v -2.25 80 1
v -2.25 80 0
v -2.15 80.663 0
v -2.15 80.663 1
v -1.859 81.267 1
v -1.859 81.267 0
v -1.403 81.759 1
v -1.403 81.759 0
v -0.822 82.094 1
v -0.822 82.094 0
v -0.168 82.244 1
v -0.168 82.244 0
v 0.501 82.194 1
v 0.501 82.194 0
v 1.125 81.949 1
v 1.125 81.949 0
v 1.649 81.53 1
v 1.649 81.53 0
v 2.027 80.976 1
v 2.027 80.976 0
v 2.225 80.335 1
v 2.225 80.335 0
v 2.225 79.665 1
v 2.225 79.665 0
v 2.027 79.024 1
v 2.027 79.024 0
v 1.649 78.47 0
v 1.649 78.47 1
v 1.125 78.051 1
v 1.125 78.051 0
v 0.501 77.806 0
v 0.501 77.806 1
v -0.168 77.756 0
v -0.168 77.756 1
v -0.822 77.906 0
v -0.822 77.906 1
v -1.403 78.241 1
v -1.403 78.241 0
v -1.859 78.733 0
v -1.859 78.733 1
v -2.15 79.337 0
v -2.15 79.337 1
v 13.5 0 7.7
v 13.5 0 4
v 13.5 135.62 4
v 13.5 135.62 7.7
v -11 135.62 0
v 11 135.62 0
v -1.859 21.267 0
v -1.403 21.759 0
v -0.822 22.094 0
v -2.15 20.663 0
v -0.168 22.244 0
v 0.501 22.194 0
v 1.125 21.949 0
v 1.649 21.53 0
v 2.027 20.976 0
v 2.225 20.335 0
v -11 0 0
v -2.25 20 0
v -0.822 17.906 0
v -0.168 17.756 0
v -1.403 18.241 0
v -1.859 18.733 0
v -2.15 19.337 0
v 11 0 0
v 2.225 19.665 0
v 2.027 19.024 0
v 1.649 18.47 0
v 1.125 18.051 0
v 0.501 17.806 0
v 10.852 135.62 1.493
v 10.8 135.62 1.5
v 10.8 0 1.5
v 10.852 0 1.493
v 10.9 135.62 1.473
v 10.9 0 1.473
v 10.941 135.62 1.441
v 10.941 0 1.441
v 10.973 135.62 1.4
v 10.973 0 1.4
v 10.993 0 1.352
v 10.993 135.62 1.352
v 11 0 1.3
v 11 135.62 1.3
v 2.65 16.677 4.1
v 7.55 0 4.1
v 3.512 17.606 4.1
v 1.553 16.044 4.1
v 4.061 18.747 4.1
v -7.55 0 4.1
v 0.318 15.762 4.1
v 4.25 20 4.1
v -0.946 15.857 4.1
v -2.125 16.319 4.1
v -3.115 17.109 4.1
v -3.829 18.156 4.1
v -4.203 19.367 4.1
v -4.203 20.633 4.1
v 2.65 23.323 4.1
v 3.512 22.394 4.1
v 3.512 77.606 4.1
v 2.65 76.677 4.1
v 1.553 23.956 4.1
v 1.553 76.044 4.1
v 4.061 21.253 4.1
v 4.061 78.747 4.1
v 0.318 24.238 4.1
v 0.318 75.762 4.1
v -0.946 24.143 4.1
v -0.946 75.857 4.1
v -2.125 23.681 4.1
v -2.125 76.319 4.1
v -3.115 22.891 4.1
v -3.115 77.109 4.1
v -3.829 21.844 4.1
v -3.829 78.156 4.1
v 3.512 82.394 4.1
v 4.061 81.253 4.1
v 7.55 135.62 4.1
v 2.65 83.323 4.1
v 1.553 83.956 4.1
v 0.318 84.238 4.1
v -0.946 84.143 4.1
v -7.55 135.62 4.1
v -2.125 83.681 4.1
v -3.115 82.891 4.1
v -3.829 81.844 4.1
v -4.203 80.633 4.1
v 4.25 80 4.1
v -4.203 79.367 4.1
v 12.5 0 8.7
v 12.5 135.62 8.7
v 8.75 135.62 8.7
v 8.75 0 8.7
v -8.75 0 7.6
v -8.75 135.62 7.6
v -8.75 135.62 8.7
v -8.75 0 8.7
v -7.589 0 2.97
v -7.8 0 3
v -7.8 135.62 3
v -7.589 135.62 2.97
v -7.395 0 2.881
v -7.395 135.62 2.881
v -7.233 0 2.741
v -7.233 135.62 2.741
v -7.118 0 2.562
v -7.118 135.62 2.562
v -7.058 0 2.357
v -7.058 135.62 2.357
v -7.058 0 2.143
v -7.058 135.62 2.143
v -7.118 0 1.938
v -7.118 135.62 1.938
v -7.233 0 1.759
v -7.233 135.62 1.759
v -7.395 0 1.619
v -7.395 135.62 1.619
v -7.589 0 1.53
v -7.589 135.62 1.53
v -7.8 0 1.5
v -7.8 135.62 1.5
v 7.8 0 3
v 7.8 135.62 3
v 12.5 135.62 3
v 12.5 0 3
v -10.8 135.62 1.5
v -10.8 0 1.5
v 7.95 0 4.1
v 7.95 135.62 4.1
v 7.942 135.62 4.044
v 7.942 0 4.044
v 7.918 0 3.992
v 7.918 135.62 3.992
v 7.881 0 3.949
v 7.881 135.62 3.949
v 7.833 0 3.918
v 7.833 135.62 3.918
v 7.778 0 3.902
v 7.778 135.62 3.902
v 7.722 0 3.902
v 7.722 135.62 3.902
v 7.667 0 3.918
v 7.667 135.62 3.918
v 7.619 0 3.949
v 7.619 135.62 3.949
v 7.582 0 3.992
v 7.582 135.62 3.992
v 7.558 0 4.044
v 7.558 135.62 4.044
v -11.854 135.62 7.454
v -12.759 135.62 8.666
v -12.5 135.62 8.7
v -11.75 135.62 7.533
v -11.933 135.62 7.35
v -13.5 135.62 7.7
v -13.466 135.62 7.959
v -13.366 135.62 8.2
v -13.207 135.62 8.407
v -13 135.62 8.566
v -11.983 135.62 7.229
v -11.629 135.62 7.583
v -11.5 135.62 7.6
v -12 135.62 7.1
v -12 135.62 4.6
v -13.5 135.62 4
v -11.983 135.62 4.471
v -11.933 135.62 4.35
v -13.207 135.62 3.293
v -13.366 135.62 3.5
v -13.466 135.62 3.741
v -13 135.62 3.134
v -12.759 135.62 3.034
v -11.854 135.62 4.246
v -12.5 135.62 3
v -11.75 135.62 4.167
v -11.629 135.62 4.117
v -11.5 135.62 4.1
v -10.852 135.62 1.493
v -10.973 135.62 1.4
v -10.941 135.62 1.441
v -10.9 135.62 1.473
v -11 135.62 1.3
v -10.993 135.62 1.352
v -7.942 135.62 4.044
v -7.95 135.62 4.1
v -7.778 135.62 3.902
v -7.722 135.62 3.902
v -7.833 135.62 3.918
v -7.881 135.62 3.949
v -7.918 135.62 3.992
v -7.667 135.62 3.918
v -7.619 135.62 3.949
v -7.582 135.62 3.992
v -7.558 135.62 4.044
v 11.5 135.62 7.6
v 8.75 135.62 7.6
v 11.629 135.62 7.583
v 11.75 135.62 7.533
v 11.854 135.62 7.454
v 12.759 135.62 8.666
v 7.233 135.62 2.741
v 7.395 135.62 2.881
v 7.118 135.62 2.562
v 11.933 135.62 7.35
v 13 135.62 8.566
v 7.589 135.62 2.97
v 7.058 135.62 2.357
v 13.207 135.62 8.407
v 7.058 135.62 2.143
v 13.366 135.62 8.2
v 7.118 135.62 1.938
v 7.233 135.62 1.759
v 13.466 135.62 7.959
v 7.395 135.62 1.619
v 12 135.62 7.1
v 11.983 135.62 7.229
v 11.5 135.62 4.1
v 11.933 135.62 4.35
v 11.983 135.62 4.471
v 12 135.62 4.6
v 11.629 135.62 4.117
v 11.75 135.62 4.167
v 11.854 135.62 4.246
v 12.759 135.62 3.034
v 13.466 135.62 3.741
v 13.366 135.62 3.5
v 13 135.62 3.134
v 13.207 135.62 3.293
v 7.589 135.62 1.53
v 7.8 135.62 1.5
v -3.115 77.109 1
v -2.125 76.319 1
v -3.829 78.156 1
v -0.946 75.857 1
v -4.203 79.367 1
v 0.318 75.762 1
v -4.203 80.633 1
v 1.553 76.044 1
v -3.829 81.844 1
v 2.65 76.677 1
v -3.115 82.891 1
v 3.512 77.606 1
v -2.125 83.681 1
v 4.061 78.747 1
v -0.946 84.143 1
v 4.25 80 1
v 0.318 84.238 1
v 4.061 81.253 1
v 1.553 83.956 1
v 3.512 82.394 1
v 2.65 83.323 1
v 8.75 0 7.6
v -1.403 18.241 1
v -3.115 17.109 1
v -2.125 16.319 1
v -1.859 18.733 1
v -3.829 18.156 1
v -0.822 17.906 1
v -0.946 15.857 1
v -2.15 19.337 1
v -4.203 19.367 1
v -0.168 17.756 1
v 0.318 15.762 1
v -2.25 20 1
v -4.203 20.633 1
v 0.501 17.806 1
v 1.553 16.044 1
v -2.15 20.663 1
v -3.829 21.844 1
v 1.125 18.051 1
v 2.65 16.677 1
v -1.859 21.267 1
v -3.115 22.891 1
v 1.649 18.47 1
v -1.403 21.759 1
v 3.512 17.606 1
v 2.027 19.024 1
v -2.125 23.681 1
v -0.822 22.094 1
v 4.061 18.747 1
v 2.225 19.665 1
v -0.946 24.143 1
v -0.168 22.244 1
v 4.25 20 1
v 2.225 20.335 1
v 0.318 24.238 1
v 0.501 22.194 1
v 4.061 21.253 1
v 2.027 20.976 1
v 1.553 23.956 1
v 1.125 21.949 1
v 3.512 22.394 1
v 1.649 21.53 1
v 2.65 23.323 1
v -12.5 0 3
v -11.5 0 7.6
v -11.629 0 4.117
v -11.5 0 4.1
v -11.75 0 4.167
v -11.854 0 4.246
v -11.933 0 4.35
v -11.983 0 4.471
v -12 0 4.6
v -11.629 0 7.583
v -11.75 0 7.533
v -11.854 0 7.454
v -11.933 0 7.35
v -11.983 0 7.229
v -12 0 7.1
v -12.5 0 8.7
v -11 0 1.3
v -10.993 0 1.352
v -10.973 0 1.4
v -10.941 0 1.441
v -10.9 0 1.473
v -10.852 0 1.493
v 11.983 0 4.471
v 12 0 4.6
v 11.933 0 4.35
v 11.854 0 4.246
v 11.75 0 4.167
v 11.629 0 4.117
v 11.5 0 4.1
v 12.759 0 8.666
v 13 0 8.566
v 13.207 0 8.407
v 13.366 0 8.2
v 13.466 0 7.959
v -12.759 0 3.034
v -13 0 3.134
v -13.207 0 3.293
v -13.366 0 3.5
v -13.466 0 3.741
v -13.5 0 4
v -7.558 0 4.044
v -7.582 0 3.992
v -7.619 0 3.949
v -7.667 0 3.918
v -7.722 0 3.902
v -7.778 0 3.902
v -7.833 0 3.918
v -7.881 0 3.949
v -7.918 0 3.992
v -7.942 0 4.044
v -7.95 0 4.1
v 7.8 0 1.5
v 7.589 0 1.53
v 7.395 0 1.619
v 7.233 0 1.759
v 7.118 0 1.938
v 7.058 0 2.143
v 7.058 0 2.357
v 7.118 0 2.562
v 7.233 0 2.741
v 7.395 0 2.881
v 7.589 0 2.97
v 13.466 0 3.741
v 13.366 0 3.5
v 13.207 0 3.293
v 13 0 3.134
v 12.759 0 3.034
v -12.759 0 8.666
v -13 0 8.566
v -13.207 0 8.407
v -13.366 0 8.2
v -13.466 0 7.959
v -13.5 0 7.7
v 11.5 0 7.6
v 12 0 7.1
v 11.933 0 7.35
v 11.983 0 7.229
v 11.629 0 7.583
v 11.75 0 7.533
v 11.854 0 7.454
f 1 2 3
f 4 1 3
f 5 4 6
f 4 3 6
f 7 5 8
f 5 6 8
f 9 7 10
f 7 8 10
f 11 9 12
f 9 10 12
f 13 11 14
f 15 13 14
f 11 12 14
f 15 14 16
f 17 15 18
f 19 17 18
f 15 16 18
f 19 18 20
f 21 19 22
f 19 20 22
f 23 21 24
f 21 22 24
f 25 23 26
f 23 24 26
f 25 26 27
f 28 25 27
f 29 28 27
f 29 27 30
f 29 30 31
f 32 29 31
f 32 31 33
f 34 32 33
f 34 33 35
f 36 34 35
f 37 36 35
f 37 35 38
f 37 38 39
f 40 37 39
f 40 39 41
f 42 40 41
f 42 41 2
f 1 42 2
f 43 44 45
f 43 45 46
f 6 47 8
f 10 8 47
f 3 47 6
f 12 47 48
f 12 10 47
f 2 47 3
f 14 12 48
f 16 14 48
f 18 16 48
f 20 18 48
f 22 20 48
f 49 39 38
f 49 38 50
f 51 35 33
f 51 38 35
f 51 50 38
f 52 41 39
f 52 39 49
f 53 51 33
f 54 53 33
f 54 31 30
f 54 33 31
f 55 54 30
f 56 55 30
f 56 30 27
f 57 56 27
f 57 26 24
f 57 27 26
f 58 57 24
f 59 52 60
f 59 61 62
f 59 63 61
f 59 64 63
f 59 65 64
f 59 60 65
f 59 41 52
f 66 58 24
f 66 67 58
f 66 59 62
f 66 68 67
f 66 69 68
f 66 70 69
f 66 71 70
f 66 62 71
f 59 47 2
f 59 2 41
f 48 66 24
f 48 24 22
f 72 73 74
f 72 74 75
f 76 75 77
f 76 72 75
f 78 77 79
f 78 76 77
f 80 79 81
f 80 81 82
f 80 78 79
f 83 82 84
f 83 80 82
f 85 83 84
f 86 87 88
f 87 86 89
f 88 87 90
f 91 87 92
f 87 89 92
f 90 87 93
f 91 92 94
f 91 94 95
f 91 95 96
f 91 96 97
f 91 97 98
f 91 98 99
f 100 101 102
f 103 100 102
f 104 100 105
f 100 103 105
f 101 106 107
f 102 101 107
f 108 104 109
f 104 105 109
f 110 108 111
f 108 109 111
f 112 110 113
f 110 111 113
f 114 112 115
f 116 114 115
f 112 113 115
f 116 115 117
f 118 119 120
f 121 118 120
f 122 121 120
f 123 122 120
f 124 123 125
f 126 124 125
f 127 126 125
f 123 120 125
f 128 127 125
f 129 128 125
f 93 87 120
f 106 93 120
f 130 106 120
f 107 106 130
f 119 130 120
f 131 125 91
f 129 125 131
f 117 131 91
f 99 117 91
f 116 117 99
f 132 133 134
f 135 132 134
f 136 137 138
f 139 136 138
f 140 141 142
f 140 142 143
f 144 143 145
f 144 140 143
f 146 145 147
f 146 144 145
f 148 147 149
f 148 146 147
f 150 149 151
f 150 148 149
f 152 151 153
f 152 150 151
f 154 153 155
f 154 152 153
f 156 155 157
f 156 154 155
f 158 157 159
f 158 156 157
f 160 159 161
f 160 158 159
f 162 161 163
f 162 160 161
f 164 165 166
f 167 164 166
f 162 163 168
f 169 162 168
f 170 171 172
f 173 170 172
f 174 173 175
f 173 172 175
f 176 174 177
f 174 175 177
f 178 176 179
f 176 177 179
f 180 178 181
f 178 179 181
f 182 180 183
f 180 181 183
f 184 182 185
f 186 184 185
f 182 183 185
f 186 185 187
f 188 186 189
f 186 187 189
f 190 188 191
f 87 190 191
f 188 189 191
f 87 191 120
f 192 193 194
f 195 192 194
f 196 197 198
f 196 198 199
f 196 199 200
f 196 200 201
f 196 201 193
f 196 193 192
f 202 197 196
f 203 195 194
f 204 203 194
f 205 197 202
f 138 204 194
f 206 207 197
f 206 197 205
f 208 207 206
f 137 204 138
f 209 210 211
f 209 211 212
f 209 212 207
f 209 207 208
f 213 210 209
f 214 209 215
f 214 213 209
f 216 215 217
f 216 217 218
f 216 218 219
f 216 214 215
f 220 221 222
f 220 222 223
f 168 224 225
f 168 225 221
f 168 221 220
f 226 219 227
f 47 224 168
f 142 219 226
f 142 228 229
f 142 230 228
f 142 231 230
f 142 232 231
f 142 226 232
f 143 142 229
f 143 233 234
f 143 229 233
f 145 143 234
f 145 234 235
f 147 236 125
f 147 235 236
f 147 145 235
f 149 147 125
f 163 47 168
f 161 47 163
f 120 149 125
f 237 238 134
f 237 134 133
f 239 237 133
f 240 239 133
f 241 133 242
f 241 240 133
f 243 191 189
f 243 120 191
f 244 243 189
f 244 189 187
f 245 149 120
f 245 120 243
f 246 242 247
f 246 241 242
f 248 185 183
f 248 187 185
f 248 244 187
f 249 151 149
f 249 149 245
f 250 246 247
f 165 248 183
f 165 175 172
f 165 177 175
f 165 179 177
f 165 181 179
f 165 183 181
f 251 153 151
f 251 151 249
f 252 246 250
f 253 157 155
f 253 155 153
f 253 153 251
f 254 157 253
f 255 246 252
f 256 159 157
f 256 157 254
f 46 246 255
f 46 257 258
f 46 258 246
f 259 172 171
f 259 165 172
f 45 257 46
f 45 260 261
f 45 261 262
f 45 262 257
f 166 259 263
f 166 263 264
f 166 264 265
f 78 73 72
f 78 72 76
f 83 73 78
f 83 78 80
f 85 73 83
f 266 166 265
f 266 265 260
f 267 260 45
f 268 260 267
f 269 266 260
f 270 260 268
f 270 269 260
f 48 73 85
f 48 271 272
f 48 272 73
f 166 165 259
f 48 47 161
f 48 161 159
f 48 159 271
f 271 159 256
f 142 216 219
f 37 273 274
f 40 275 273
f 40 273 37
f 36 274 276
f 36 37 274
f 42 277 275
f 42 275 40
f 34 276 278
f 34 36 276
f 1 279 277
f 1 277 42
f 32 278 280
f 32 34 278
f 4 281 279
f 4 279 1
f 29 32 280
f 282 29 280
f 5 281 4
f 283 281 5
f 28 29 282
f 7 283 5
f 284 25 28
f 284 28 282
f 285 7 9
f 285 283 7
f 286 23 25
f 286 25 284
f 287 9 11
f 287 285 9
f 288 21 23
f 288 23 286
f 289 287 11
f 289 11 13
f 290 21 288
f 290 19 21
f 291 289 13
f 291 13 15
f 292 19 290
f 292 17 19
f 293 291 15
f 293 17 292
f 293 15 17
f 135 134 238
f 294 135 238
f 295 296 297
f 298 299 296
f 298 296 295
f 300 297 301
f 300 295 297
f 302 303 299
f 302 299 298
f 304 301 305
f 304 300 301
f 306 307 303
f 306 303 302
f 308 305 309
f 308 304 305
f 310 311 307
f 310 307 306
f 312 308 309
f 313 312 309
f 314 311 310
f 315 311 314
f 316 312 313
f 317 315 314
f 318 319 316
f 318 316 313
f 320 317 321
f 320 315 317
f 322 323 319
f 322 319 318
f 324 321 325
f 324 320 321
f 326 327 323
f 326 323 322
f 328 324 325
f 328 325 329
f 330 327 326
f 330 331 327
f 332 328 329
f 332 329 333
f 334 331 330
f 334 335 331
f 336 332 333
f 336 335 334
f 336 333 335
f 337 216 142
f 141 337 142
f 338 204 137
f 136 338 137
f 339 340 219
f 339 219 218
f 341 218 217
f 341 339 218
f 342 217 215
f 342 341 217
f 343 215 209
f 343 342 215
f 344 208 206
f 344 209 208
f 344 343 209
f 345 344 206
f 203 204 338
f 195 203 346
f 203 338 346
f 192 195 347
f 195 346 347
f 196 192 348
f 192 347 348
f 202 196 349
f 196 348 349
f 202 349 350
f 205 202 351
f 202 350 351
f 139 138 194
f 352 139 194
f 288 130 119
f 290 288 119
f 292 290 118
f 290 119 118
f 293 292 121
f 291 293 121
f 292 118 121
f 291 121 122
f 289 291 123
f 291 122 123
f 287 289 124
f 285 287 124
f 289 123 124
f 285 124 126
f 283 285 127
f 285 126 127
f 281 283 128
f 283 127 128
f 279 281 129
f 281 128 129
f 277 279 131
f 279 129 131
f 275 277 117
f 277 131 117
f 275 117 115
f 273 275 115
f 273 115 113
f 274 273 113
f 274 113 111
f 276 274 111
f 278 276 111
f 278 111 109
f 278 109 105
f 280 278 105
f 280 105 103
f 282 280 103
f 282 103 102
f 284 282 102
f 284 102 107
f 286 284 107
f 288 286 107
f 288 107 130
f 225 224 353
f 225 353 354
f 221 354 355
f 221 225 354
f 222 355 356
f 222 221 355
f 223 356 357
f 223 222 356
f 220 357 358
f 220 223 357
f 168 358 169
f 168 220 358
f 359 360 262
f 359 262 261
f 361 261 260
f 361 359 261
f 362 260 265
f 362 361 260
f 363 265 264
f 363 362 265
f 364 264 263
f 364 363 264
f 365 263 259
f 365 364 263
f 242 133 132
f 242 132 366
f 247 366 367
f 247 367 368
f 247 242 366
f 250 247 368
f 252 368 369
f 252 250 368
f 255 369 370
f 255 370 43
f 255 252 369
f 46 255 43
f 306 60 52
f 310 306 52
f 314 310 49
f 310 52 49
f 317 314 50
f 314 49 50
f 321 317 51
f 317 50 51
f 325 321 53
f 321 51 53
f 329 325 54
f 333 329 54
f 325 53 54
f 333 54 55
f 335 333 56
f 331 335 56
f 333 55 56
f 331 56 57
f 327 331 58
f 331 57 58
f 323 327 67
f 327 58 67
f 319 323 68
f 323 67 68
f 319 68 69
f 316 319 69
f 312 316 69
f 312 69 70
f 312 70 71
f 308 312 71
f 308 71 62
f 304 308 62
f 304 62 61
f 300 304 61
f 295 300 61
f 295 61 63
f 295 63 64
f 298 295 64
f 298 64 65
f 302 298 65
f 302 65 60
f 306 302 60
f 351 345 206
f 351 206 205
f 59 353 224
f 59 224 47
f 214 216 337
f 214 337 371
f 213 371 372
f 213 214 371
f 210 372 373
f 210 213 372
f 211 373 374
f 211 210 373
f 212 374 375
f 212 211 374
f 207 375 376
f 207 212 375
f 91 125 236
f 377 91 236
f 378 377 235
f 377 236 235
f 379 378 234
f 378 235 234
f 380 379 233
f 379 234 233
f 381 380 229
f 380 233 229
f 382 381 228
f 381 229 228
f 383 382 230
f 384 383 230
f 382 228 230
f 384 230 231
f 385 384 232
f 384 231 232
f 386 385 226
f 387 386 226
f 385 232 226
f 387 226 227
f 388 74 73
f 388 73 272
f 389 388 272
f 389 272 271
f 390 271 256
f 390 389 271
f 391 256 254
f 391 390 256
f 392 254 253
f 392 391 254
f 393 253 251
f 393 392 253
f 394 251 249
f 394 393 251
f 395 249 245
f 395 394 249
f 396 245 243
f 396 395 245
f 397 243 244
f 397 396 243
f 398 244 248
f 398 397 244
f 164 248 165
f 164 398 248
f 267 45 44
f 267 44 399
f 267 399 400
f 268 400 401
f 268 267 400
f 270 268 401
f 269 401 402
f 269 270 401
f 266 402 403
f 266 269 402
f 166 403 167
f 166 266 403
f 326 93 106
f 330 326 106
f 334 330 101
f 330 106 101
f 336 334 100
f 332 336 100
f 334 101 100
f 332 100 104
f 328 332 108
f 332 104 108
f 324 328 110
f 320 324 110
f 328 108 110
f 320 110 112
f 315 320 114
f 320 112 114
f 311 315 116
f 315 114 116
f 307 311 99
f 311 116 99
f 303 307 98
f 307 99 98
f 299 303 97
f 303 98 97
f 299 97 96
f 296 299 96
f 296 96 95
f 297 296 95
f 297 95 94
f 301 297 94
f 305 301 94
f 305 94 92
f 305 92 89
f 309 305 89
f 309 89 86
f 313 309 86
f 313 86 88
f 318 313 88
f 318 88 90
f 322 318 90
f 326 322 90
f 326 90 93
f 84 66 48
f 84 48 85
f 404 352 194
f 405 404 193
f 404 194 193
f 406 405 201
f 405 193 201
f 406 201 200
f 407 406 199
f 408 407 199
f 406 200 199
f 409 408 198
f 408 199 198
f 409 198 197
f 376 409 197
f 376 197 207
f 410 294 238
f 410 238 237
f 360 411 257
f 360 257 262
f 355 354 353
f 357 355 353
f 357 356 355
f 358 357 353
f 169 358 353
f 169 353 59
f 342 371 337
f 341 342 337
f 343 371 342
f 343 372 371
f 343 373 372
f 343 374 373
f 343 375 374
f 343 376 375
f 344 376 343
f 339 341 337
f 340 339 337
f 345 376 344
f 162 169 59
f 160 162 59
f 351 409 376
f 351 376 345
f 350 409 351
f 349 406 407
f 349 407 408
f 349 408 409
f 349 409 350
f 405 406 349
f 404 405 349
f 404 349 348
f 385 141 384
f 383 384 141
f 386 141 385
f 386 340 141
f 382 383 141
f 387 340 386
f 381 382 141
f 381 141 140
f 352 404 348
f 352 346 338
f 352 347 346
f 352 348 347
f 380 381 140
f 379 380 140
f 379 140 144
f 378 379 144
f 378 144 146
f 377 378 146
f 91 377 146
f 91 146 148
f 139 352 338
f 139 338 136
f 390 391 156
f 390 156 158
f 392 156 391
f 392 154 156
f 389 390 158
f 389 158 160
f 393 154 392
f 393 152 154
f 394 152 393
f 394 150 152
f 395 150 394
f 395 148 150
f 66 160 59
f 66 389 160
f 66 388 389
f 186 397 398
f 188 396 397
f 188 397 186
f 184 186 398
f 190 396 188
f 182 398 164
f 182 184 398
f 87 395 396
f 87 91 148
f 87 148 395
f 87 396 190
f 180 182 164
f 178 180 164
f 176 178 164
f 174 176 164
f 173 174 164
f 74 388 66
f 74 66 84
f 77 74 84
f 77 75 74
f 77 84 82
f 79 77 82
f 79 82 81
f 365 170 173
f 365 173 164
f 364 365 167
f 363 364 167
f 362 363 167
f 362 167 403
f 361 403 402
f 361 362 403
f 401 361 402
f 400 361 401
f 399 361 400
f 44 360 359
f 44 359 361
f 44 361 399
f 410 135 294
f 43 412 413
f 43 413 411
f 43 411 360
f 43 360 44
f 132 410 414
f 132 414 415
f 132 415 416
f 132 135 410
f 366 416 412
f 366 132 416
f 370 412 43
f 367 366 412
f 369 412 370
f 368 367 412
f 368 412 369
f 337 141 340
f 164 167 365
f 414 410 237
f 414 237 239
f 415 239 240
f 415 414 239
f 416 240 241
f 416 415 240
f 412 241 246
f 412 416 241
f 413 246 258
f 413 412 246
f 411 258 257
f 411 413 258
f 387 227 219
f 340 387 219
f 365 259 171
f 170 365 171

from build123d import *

# Parameters (mm, degrees)
BOSS_EXTRU_1_DEPTH                                 = 1000
ENL_V_MAT_EXTRU_1_DEPTH                            = 1001
CHAMBRAGE_POUR_VIS_T_TE_HEXAGONALE_M41_D           = 4.5
CHAMBRAGE_POUR_VIS_T_TE_HEXAGONALE_M41_DEPTH       = 4.1
CHAMBRAGE_POUR_VIS_T_TE_HEXAGONALE_M41_CBORE_D     = 8.5
CHAMBRAGE_POUR_VIS_T_TE_HEXAGONALE_M41_CBORE_DEPTH = 3.1
DIAM_TRE_DU_PER_AGE_0_4_0_4_1_D                    = 0.4
DIAM_TRE_DU_PER_AGE_0_4_0_4_1_DEPTH                = 1000
CONG_1_R                                           = 0.2
CONG_2_R                                           = 0.5
CONG_3_R                                           = 1
ESQUISSE9_W                                        = 27
ESQUISSE9_H                                        = 864.38
ENL_V_MAT_EXTRU_2_DEPTH                            = 9.7
ENL_V_MAT_EXTRU_2_DEPTH_BACK                       = 1


with BuildPart() as part:
    # Esquisse1 → Boss.-Extru.1 (new body)
    with BuildSketch(Plane.XZ):
        with BuildLine():
            Line((13.5, 8.7), (-13.5, 8.7))
            Line((-13.5, 8.7), (-13.5, 3))
            Line((-13.5, 3), (-7.8, 3))
            ThreePointArc((-7.8, 3), (-7.05, 2.25), (-7.8, 1.5))
            Line((-7.8, 1.5), (-11, 1.5))
            Line((-11, 1.5), (-11, 0))
            Line((-11, 0), (11, 0))
            Line((11, 0), (11, 1.5))
            Line((11, 1.5), (7.8, 1.5))
            ThreePointArc((7.8, 1.5), (7.05, 2.25), (7.8, 3))
            Line((7.8, 3), (13.5, 3))
            Line((13.5, 3), (13.5, 8.7))
        make_face()
    extrude(amount=-BOSS_EXTRU_1_DEPTH)

    # Esquisse2 → Enlèv. mat.-Extru.1 (cut, through all)
    with BuildSketch(Plane(origin=(0, 1000, 0), x_dir=(-1, 0, 0), z_dir=(0, 1, 0))):
        Polygon((8.75, 8.7), (-8.75, 8.7), (-8.75, 7.6), (-12, 7.6), (-12, 4.1), (12, 4.1), (12, 7.6), (8.75, 7.6), align=None)
    extrude(amount=-ENL_V_MAT_EXTRU_1_DEPTH, mode=Mode.SUBTRACT)

    # Chambrage pour vis à tête hexagonale M41
    with Locations(Plane.XY.offset(4.1)):
        with Locations((0, 980), (0, 920), (0, 860), (0, 800), (0, 740), (0, 680), (0, 620), (0, 560), (0, 500), (0, 440), (0, 380), (0, 320), (0, 260), (0, 200), (0, 140), (0, 80), (0, 20)):
            CounterBoreHole(CHAMBRAGE_POUR_VIS_T_TE_HEXAGONALE_M41_D / 2, CHAMBRAGE_POUR_VIS_T_TE_HEXAGONALE_M41_CBORE_D / 2, CHAMBRAGE_POUR_VIS_T_TE_HEXAGONALE_M41_CBORE_DEPTH, depth=CHAMBRAGE_POUR_VIS_T_TE_HEXAGONALE_M41_DEPTH)

    # Diamètre du perçage Ø0.4 (0.4)1
    with Locations(Plane(origin=(0, 0, 0), x_dir=(-1, 0, 0), z_dir=(0, -1, 0))):
        with Locations((7.75, -4.1), (-7.75, -4.1)):
            Hole(DIAM_TRE_DU_PER_AGE_0_4_0_4_1_D / 2, depth=DIAM_TRE_DU_PER_AGE_0_4_0_4_1_DEPTH)

    # Congé1
    cong_1_edges = [part.edges().sort_by_distance(p)[0] for p in [
        (11, 500, 1.5),
        (-11, 500, 1.5),
    ]]
    fillet(cong_1_edges, radius=CONG_1_R)

    # Congé2
    cong_2_edges = [part.edges().sort_by_distance(p)[0] for p in [
        (-12, 500, 7.6),
        (-12, 500, 4.1),
        (12, 500, 4.1),
        (12, 500, 7.6),
    ]]
    fillet(cong_2_edges, radius=CONG_2_R)

    # Congé3
    cong_3_edges = [part.edges().sort_by_distance(p)[0] for p in [
        (13.5, 500, 3),
        (-13.5, 500, 3),
        (-13.5, 500, 8.7),
        (13.5, 500, 8.7),
    ]]
    fillet(cong_3_edges, radius=CONG_3_R)

    # Esquisse9 → Enlèv. mat.-Extru.2 (cut, two sides)
    with BuildSketch(Plane.XY) as enl_v_mat_extru_2_sk:
        with Locations((0, 567.81)):
            Rectangle(ESQUISSE9_W, ESQUISSE9_H)
    extrude(amount=ENL_V_MAT_EXTRU_2_DEPTH, mode=Mode.SUBTRACT)
    extrude(enl_v_mat_extru_2_sk.sketch, amount=-ENL_V_MAT_EXTRU_2_DEPTH_BACK, mode=Mode.SUBTRACT)


solid = part.part
